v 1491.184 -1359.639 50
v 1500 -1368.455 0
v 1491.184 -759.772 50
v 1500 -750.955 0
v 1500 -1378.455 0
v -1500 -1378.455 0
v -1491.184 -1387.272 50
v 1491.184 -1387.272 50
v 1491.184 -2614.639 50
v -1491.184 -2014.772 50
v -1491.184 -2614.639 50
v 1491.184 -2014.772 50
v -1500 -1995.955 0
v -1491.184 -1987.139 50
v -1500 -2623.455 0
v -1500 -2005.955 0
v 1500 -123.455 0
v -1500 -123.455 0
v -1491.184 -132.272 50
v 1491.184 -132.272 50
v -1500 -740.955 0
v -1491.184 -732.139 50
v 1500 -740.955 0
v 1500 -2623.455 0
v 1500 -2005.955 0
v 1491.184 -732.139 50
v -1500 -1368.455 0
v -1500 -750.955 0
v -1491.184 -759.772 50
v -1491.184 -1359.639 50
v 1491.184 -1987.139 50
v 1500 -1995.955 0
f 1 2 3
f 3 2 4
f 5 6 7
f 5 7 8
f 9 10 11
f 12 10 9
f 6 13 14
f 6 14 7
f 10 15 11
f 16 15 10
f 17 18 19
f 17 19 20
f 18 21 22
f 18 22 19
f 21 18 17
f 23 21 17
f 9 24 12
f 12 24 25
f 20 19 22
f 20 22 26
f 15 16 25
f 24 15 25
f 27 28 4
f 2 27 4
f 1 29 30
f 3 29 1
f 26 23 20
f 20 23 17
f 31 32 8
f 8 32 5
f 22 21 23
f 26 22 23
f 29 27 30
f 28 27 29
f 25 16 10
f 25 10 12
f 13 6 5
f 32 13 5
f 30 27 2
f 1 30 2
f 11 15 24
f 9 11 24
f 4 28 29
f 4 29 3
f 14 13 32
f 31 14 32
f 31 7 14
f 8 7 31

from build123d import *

# Parameters (mm, degrees)
SKETCH_1_W                = 3000
SKETCH_1_H                = 617.5
EXTRUDE_1_DEPTH           = 50
EXTRUDE_1_DRAFT           = 10
EXTRUDE_1_PROFILE_2_DEPTH = 50
EXTRUDE_1_PROFILE_2_DRAFT = 10
EXTRUDE_1_PROFILE_3_DEPTH = 50
EXTRUDE_1_PROFILE_3_DRAFT = 10
EXTRUDE_1_PROFILE_4_DEPTH = 50
EXTRUDE_1_PROFILE_4_DRAFT = 10


with BuildPart() as part:
    # Эскиз1 → Бобышка-Вытянуть1 (with draft: the straight prism first)
    with BuildSketch(Plane.XY):
        with Locations((0, -432.20542544)):
            Rectangle(SKETCH_1_W, SKETCH_1_H)
    extrude(amount=EXTRUDE_1_DEPTH)
    # Бобышка-Вытянуть1: the draft: its side faces are tilted about the plane it starts from
    extrude_1_sides = [part.faces().sort_by_distance(p)[0] for p in [
        (-1500, -432.20542544, 25),
        (0, -740.95542544, 25),
        (1500, -432.20542544, 25),
        (0, -123.45542544, 25),
    ]]
    draft(extrude_1_sides, Plane.XY, EXTRUDE_1_DRAFT)


with BuildPart() as body_2:
    # Эскиз1 → Бобышка-Вытянуть1 profile 2 (with draft: the straight prism first)
    with BuildSketch(Plane.XY):
        with Locations((0, -1059.70542544)):
            Rectangle(SKETCH_1_W, SKETCH_1_H)
    extrude(amount=EXTRUDE_1_PROFILE_2_DEPTH)
    # Бобышка-Вытянуть1 profile 2: the draft: its side faces are tilted about the plane it starts from
    extrude_1_profile_2_sides = [body_2.faces().sort_by_distance(p)[0] for p in [
        (-1500, -1059.70542544, 25),
        (0, -1368.45542544, 25),
        (1500, -1059.70542544, 25),
        (0, -750.95542544, 25),
    ]]
    draft(extrude_1_profile_2_sides, Plane.XY, EXTRUDE_1_PROFILE_2_DRAFT)


with BuildPart() as body_3:
    # Эскиз1 → Бобышка-Вытянуть1 profile 3 (with draft: the straight prism first)
    with BuildSketch(Plane.XY):
        with Locations((0, -1687.20542544)):
            Rectangle(SKETCH_1_W, SKETCH_1_H)
    extrude(amount=EXTRUDE_1_PROFILE_3_DEPTH)
    # Бобышка-Вытянуть1 profile 3: the draft: its side faces are tilted about the plane it starts from
    extrude_1_profile_3_sides = [body_3.faces().sort_by_distance(p)[0] for p in [
        (-1500, -1687.20542544, 25),
        (0, -1995.95542544, 25),
        (1500, -1687.20542544, 25),
        (0, -1378.45542544, 25),
    ]]
    draft(extrude_1_profile_3_sides, Plane.XY, EXTRUDE_1_PROFILE_3_DRAFT)


with BuildPart() as body_4:
    # Эскиз1 → Бобышка-Вытянуть1 profile 4 (with draft: the straight prism first)
    with BuildSketch(Plane.XY):
        with Locations((0, -2314.70542544)):
            Rectangle(SKETCH_1_W, SKETCH_1_H)
    extrude(amount=EXTRUDE_1_PROFILE_4_DEPTH)
    # Бобышка-Вытянуть1 profile 4: the draft: its side faces are tilted about the plane it starts from
    extrude_1_profile_4_sides = [body_4.faces().sort_by_distance(p)[0] for p in [
        (-1500, -2314.70542544, 25),
        (0, -2623.45542544, 25),
        (1500, -2314.70542544, 25),
        (0, -2005.95542544, 25),
    ]]
    draft(extrude_1_profile_4_sides, Plane.XY, EXTRUDE_1_PROFILE_4_DRAFT)


solid = Compound([part.part, body_2.part, body_3.part, body_4.part])
